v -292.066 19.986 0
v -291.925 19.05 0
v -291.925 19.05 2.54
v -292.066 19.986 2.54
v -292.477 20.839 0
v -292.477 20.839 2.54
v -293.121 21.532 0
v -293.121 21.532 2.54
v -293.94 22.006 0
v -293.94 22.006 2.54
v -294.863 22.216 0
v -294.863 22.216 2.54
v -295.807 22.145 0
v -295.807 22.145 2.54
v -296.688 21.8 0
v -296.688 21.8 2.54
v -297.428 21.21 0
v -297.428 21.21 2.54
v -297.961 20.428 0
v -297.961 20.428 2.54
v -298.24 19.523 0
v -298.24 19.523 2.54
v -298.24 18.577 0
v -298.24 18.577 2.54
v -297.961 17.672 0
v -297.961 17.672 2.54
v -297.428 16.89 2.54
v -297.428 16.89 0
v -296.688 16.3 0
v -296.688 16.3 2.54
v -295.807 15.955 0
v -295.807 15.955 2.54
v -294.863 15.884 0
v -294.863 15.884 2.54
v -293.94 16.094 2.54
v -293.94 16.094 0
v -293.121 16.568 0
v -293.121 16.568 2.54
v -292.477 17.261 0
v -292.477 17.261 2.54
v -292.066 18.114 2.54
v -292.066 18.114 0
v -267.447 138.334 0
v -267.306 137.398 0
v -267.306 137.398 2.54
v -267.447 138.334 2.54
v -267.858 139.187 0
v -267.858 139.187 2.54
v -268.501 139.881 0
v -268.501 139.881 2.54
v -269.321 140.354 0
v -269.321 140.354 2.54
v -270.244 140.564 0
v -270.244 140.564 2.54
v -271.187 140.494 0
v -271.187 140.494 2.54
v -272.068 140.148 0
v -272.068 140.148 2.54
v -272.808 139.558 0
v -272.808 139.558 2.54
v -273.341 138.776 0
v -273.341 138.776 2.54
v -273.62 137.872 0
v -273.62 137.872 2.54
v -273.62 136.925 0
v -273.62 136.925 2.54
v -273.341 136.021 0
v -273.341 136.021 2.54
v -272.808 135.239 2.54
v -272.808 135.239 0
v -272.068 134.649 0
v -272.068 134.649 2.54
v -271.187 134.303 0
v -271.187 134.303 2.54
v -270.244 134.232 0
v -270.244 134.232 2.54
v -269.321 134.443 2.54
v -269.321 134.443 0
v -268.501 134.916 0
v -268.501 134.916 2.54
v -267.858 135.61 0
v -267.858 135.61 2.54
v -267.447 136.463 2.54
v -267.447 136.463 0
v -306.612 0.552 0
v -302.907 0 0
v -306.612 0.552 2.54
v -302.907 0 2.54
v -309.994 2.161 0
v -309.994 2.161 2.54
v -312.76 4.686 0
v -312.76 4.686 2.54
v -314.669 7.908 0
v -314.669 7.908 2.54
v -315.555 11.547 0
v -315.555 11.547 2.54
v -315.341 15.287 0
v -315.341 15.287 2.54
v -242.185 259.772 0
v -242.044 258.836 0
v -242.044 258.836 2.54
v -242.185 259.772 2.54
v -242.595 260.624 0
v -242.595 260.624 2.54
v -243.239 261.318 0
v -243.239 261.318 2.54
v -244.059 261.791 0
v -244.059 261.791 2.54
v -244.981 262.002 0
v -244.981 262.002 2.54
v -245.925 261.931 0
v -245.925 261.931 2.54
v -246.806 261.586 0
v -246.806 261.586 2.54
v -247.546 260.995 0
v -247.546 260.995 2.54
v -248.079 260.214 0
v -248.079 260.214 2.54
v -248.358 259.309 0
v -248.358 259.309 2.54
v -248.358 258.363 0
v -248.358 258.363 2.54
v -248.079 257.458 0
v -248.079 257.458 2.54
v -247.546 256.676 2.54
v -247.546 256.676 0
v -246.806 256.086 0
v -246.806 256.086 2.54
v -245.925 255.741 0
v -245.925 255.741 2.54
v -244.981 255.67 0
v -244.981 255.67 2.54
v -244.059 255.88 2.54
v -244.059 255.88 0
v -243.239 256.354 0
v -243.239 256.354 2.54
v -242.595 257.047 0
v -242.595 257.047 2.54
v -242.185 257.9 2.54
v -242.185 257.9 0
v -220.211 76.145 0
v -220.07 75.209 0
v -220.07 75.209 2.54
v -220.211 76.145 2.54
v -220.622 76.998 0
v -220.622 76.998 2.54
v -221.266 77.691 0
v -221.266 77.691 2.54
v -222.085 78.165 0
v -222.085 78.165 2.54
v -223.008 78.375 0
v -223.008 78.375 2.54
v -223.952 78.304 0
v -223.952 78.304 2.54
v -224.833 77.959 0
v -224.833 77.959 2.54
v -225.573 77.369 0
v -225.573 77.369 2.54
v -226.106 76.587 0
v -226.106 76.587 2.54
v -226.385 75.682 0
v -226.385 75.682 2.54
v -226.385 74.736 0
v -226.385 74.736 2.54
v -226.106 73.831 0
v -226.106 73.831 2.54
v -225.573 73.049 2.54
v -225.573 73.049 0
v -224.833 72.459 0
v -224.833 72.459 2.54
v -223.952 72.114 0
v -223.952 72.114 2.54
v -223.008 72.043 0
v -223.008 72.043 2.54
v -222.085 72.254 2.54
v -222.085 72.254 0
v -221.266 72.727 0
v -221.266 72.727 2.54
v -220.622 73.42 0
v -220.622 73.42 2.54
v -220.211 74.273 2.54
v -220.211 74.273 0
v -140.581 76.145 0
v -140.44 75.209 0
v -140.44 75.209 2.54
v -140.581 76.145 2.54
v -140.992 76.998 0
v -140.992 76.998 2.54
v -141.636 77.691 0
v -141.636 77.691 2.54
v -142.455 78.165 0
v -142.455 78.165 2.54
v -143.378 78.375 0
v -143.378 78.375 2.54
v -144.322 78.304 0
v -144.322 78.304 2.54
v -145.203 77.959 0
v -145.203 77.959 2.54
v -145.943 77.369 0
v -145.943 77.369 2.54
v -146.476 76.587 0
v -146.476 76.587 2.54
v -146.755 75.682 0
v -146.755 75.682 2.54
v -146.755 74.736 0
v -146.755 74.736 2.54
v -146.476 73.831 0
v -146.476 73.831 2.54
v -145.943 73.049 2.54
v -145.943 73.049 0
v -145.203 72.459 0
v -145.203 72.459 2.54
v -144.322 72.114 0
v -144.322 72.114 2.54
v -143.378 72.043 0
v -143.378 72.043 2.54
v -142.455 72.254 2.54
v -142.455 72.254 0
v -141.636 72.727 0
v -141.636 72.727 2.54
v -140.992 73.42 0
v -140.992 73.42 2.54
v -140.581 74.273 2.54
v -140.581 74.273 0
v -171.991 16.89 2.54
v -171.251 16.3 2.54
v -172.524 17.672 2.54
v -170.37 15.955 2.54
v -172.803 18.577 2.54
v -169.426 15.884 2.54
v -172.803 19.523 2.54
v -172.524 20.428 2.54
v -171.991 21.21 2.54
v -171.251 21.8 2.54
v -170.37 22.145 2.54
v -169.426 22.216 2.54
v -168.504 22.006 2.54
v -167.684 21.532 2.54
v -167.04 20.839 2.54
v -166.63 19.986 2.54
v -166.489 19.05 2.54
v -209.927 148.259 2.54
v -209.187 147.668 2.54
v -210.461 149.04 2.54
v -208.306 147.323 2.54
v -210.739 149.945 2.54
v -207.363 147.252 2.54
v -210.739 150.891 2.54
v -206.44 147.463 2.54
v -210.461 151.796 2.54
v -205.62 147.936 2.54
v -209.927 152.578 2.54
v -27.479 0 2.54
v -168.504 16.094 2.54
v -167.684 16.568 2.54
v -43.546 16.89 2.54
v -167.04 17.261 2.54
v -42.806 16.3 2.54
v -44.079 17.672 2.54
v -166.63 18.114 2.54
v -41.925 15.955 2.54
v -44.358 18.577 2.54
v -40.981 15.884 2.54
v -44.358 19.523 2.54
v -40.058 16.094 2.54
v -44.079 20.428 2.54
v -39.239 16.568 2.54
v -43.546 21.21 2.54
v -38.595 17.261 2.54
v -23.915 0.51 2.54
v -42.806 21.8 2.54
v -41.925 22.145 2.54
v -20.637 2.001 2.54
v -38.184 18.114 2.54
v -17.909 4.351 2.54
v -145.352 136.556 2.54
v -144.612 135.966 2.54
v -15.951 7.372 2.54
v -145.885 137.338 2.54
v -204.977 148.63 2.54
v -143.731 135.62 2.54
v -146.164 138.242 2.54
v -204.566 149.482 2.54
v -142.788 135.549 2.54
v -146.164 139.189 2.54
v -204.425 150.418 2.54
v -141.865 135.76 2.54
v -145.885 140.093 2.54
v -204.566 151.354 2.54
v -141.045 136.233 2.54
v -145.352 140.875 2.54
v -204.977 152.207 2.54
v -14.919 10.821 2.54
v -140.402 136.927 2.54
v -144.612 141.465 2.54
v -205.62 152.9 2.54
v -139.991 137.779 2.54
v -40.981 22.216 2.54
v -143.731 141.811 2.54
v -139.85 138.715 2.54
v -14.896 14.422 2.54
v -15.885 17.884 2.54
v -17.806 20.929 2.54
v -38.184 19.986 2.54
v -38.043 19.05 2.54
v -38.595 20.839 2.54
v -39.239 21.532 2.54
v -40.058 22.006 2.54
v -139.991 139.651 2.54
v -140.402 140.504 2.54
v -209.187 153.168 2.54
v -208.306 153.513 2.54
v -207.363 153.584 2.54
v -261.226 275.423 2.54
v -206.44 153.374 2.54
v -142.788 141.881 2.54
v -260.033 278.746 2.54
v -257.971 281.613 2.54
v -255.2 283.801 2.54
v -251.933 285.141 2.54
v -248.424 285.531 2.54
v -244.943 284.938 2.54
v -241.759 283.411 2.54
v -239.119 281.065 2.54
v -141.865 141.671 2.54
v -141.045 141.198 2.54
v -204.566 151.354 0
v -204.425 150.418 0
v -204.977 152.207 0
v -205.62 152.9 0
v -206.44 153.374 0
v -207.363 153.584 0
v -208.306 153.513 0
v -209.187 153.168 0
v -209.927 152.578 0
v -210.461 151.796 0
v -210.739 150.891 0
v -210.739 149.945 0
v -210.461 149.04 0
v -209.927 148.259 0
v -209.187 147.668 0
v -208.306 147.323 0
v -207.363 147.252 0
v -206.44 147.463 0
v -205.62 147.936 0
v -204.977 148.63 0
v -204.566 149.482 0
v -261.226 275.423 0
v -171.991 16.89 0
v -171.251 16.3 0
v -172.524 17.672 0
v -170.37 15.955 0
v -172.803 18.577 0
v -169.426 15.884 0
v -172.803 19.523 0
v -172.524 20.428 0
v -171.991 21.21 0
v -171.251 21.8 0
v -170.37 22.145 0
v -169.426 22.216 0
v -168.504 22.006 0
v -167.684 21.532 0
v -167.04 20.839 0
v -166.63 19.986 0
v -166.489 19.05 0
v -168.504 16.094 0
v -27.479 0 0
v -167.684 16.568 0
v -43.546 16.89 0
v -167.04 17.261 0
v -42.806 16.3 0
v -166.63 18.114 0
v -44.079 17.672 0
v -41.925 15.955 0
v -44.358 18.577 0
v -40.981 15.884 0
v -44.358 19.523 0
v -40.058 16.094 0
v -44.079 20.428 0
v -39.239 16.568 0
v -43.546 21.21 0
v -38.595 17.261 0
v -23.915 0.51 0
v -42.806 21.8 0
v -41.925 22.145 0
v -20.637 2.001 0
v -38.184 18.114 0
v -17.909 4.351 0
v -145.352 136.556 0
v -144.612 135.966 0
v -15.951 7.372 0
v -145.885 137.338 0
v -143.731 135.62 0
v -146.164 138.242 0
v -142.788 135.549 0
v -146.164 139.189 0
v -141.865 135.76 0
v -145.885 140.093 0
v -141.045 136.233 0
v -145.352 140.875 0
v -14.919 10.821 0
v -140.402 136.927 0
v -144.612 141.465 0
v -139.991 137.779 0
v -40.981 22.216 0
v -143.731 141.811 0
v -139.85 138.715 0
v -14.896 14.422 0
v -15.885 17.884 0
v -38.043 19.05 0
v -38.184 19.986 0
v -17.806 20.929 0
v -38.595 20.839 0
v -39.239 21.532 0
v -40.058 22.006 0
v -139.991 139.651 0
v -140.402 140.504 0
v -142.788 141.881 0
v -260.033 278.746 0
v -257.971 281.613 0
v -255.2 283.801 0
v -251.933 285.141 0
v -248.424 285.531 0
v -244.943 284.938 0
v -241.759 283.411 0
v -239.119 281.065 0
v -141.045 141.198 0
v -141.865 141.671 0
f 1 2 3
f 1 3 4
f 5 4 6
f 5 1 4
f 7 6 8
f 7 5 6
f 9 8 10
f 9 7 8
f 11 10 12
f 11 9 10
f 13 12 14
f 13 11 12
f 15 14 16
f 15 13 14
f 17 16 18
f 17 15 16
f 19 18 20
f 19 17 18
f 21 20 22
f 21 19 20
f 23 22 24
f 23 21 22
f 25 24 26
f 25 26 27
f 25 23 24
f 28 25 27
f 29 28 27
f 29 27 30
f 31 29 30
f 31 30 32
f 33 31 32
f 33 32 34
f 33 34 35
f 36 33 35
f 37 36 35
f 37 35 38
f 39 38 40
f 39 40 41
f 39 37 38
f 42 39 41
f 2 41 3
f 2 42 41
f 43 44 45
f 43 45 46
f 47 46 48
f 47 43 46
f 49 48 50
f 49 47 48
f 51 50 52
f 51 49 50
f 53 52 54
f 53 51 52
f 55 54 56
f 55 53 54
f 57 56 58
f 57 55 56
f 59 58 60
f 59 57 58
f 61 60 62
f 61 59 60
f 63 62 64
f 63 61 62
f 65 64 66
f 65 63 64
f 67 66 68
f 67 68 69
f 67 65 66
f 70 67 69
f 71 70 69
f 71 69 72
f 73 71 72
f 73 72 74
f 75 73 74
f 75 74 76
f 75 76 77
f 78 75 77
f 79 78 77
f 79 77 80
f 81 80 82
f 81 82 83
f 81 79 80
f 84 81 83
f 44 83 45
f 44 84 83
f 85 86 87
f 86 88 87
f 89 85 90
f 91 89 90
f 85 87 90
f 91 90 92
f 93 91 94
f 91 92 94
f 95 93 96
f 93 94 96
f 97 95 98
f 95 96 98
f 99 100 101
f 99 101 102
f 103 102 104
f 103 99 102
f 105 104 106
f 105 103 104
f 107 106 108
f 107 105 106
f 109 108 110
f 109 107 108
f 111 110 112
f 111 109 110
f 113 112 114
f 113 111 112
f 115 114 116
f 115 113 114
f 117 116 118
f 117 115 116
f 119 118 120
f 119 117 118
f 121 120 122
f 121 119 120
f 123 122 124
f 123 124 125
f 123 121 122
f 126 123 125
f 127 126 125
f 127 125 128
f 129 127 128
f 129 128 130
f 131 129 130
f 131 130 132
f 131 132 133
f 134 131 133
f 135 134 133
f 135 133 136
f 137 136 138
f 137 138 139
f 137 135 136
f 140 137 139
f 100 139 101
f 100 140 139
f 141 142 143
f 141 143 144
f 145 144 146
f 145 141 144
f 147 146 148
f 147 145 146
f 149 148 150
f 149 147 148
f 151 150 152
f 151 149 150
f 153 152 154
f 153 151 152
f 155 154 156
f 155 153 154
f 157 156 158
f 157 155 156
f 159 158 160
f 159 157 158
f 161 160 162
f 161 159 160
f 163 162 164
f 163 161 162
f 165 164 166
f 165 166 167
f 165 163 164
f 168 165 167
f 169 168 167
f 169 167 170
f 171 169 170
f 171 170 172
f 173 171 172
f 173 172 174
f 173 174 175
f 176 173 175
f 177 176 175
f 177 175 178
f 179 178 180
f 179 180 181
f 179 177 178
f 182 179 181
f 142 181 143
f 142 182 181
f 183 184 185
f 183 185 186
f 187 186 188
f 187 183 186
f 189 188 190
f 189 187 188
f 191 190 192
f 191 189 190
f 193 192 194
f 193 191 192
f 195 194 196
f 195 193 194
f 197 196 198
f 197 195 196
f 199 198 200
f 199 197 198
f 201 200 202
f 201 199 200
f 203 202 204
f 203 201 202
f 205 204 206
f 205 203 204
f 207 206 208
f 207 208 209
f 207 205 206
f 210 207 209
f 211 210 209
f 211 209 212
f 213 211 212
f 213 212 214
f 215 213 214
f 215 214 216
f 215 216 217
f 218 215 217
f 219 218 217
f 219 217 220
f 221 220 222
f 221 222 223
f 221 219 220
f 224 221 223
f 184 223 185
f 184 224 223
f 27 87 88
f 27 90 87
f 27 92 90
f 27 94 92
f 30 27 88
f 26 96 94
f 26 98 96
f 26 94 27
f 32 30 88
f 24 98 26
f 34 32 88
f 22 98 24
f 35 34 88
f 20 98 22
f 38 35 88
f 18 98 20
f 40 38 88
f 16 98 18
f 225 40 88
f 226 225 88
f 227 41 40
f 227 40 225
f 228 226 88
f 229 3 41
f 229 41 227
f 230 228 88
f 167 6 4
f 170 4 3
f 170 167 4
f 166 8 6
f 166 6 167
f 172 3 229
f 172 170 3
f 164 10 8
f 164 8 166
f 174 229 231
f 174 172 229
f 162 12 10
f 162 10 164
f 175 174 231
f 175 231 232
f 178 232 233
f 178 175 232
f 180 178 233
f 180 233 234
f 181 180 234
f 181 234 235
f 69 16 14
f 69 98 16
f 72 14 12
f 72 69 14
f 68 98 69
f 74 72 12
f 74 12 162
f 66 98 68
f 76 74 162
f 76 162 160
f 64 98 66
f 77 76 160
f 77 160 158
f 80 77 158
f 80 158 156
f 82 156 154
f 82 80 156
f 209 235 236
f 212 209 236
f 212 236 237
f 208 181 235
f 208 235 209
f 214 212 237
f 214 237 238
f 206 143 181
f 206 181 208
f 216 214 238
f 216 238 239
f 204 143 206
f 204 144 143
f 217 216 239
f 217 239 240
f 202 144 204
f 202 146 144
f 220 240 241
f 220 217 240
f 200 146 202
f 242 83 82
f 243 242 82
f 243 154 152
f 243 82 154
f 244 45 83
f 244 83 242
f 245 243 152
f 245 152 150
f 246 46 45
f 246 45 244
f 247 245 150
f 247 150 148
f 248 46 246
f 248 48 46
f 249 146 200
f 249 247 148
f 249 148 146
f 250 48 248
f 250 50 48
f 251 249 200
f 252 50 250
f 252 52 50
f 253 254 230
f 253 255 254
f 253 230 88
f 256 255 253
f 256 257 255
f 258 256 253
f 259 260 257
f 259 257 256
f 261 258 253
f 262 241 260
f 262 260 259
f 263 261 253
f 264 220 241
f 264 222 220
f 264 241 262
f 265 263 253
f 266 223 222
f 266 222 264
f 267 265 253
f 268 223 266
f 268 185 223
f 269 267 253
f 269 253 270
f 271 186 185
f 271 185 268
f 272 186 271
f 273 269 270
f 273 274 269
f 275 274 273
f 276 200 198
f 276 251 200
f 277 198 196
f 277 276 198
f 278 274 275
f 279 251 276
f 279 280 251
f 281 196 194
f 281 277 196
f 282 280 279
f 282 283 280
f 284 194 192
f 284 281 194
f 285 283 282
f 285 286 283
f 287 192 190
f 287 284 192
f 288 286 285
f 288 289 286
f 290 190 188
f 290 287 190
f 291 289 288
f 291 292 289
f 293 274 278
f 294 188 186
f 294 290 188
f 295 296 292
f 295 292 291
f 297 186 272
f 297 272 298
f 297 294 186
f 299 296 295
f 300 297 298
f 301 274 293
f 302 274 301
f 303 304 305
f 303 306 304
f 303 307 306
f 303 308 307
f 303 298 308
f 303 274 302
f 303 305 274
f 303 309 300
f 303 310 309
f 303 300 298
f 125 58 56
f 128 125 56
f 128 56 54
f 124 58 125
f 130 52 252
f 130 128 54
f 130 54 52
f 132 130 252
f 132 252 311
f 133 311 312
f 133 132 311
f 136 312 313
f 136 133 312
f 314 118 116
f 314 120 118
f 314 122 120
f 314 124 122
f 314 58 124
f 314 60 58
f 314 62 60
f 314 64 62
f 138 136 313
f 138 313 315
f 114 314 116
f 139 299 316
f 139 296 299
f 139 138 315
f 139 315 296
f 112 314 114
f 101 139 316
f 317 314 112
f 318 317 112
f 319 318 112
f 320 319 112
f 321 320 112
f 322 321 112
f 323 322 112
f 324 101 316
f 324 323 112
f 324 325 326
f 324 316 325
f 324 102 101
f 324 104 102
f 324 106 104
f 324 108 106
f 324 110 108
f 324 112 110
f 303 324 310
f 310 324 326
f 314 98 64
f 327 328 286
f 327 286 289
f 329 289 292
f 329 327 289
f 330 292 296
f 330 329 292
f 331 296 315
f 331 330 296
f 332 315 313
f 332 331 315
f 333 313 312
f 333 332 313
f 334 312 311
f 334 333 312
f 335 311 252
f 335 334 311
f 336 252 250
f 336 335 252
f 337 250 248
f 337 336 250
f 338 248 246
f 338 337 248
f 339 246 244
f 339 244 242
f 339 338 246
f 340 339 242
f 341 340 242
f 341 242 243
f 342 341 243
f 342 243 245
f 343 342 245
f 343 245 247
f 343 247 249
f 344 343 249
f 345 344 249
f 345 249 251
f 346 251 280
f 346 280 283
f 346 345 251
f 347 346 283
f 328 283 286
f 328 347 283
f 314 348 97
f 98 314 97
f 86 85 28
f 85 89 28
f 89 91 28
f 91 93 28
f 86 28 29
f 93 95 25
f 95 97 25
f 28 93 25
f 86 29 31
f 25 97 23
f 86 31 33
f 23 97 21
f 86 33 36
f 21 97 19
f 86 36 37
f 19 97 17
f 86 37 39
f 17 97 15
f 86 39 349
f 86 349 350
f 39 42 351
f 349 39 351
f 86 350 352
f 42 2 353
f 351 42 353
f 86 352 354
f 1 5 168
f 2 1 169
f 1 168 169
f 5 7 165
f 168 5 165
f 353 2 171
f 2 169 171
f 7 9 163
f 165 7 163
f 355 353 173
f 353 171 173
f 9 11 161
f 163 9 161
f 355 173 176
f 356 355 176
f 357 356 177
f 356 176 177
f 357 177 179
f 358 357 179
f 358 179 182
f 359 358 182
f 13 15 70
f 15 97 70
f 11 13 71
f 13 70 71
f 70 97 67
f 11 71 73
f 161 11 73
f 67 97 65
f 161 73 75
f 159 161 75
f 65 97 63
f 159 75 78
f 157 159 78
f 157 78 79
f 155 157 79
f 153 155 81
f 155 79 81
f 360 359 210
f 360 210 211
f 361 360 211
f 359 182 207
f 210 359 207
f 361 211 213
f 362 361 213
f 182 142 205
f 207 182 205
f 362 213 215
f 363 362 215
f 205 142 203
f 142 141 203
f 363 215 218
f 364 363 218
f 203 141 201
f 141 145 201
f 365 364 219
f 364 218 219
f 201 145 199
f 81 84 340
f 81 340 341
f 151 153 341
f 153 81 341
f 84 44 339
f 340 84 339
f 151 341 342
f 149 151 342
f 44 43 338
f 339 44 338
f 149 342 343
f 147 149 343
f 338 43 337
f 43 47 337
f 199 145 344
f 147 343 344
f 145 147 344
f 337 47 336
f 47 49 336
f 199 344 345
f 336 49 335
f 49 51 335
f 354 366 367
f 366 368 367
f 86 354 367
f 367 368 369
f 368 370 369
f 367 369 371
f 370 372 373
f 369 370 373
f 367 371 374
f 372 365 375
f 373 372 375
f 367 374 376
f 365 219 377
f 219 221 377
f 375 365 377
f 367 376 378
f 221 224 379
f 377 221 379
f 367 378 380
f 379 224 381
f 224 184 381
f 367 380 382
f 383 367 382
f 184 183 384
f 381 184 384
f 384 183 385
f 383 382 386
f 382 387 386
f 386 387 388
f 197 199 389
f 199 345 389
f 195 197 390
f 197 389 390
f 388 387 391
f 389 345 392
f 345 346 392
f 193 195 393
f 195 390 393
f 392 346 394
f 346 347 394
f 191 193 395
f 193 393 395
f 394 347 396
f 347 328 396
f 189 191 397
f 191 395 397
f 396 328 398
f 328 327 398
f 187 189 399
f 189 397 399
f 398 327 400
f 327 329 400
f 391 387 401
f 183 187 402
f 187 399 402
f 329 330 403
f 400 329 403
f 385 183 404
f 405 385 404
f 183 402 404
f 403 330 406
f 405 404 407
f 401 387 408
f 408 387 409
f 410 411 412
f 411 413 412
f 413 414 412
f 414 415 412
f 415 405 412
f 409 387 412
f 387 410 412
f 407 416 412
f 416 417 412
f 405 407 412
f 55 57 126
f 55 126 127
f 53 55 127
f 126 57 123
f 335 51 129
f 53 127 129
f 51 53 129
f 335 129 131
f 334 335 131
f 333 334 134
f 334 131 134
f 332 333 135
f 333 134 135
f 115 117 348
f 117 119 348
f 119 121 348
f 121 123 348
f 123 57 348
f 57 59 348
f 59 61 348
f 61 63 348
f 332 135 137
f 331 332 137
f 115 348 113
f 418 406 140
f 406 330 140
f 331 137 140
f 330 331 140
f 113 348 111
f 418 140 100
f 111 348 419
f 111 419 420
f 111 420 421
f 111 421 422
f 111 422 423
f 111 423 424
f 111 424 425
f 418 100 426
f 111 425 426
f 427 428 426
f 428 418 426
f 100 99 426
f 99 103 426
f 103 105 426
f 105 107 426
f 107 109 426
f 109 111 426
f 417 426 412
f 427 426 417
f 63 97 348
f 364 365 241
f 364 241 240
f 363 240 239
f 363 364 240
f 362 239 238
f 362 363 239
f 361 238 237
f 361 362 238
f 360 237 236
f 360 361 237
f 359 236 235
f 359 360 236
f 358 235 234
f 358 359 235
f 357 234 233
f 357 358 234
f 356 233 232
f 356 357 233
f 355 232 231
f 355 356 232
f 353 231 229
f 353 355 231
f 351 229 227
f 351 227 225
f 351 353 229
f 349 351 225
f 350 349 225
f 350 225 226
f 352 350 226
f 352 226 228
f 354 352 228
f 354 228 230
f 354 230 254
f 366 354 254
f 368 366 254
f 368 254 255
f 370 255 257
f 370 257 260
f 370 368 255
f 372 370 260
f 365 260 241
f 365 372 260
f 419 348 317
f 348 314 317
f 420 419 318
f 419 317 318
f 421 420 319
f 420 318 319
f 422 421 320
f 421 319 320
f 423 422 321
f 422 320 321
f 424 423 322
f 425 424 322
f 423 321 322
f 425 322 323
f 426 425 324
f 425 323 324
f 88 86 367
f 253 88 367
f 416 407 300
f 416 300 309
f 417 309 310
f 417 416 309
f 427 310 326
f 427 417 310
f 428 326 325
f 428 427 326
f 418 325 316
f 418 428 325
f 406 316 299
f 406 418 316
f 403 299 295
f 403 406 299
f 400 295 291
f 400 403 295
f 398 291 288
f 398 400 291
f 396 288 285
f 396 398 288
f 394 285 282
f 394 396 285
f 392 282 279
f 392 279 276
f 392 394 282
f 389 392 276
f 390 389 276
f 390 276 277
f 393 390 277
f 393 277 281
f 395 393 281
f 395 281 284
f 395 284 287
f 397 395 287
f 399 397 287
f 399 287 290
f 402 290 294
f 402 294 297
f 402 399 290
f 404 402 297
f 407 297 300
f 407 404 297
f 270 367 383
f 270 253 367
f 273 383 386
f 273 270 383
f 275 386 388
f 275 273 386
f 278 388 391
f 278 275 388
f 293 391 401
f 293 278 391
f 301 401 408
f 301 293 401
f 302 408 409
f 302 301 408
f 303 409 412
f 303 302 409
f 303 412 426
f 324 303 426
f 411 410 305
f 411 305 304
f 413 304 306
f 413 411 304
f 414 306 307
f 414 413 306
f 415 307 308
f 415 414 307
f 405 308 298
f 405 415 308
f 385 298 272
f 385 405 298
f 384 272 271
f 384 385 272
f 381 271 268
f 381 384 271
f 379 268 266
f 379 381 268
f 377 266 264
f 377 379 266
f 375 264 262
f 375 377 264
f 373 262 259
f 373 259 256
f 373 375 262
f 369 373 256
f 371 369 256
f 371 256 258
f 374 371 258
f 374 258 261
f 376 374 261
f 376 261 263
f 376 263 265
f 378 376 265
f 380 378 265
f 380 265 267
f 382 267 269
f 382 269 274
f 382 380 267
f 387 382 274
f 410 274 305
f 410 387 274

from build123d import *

# Parameters (mm, degrees)
F0_R     = 3.175
F1_DEPTH = 2.54
F2_R     = 12.7


with BuildPart() as f1:
    # F0 (on Top) → F1 (new body)
    with BuildSketch(Plane.XY):
        Polygon((-318.52108, 0), (0, 0), (-255.939342, 300.836124), align=None)
        with Locations((-295.100357, 19.05)):
            Circle(F0_R, mode=Mode.SUBTRACT)
        with Locations((-169.663504, 19.05)):
            Circle(F0_R, mode=Mode.SUBTRACT)
        with Locations((-270.480821, 137.398359)):
            Circle(F0_R, mode=Mode.SUBTRACT)
        with Locations((-223.245375, 75.209031)):
            Circle(F0_R, mode=Mode.SUBTRACT)
        with Locations((-41.218348, 19.05)):
            Circle(F0_R, mode=Mode.SUBTRACT)
        with Locations((-143.615105, 75.209031)):
            Circle(F0_R, mode=Mode.SUBTRACT)
        with Locations((-143.024825, 138.71533)):
            Circle(F0_R, mode=Mode.SUBTRACT)
        with Locations((-207.599941, 150.418062)):
            Circle(F0_R, mode=Mode.SUBTRACT)
        with Locations((-245.218643, 258.835949)):
            Circle(F0_R, mode=Mode.SUBTRACT)
    extrude(amount=F1_DEPTH)

    # F2
    f2_edges = [f1.edges().sort_by_distance(p)[0] for p in [
        (-318.52108, 0, 1.27),
        (0, 0, 1.27),
        (-255.939342, 300.836124, 1.27),
    ]]
    fillet(f2_edges, radius=F2_R)


solid = f1.part
